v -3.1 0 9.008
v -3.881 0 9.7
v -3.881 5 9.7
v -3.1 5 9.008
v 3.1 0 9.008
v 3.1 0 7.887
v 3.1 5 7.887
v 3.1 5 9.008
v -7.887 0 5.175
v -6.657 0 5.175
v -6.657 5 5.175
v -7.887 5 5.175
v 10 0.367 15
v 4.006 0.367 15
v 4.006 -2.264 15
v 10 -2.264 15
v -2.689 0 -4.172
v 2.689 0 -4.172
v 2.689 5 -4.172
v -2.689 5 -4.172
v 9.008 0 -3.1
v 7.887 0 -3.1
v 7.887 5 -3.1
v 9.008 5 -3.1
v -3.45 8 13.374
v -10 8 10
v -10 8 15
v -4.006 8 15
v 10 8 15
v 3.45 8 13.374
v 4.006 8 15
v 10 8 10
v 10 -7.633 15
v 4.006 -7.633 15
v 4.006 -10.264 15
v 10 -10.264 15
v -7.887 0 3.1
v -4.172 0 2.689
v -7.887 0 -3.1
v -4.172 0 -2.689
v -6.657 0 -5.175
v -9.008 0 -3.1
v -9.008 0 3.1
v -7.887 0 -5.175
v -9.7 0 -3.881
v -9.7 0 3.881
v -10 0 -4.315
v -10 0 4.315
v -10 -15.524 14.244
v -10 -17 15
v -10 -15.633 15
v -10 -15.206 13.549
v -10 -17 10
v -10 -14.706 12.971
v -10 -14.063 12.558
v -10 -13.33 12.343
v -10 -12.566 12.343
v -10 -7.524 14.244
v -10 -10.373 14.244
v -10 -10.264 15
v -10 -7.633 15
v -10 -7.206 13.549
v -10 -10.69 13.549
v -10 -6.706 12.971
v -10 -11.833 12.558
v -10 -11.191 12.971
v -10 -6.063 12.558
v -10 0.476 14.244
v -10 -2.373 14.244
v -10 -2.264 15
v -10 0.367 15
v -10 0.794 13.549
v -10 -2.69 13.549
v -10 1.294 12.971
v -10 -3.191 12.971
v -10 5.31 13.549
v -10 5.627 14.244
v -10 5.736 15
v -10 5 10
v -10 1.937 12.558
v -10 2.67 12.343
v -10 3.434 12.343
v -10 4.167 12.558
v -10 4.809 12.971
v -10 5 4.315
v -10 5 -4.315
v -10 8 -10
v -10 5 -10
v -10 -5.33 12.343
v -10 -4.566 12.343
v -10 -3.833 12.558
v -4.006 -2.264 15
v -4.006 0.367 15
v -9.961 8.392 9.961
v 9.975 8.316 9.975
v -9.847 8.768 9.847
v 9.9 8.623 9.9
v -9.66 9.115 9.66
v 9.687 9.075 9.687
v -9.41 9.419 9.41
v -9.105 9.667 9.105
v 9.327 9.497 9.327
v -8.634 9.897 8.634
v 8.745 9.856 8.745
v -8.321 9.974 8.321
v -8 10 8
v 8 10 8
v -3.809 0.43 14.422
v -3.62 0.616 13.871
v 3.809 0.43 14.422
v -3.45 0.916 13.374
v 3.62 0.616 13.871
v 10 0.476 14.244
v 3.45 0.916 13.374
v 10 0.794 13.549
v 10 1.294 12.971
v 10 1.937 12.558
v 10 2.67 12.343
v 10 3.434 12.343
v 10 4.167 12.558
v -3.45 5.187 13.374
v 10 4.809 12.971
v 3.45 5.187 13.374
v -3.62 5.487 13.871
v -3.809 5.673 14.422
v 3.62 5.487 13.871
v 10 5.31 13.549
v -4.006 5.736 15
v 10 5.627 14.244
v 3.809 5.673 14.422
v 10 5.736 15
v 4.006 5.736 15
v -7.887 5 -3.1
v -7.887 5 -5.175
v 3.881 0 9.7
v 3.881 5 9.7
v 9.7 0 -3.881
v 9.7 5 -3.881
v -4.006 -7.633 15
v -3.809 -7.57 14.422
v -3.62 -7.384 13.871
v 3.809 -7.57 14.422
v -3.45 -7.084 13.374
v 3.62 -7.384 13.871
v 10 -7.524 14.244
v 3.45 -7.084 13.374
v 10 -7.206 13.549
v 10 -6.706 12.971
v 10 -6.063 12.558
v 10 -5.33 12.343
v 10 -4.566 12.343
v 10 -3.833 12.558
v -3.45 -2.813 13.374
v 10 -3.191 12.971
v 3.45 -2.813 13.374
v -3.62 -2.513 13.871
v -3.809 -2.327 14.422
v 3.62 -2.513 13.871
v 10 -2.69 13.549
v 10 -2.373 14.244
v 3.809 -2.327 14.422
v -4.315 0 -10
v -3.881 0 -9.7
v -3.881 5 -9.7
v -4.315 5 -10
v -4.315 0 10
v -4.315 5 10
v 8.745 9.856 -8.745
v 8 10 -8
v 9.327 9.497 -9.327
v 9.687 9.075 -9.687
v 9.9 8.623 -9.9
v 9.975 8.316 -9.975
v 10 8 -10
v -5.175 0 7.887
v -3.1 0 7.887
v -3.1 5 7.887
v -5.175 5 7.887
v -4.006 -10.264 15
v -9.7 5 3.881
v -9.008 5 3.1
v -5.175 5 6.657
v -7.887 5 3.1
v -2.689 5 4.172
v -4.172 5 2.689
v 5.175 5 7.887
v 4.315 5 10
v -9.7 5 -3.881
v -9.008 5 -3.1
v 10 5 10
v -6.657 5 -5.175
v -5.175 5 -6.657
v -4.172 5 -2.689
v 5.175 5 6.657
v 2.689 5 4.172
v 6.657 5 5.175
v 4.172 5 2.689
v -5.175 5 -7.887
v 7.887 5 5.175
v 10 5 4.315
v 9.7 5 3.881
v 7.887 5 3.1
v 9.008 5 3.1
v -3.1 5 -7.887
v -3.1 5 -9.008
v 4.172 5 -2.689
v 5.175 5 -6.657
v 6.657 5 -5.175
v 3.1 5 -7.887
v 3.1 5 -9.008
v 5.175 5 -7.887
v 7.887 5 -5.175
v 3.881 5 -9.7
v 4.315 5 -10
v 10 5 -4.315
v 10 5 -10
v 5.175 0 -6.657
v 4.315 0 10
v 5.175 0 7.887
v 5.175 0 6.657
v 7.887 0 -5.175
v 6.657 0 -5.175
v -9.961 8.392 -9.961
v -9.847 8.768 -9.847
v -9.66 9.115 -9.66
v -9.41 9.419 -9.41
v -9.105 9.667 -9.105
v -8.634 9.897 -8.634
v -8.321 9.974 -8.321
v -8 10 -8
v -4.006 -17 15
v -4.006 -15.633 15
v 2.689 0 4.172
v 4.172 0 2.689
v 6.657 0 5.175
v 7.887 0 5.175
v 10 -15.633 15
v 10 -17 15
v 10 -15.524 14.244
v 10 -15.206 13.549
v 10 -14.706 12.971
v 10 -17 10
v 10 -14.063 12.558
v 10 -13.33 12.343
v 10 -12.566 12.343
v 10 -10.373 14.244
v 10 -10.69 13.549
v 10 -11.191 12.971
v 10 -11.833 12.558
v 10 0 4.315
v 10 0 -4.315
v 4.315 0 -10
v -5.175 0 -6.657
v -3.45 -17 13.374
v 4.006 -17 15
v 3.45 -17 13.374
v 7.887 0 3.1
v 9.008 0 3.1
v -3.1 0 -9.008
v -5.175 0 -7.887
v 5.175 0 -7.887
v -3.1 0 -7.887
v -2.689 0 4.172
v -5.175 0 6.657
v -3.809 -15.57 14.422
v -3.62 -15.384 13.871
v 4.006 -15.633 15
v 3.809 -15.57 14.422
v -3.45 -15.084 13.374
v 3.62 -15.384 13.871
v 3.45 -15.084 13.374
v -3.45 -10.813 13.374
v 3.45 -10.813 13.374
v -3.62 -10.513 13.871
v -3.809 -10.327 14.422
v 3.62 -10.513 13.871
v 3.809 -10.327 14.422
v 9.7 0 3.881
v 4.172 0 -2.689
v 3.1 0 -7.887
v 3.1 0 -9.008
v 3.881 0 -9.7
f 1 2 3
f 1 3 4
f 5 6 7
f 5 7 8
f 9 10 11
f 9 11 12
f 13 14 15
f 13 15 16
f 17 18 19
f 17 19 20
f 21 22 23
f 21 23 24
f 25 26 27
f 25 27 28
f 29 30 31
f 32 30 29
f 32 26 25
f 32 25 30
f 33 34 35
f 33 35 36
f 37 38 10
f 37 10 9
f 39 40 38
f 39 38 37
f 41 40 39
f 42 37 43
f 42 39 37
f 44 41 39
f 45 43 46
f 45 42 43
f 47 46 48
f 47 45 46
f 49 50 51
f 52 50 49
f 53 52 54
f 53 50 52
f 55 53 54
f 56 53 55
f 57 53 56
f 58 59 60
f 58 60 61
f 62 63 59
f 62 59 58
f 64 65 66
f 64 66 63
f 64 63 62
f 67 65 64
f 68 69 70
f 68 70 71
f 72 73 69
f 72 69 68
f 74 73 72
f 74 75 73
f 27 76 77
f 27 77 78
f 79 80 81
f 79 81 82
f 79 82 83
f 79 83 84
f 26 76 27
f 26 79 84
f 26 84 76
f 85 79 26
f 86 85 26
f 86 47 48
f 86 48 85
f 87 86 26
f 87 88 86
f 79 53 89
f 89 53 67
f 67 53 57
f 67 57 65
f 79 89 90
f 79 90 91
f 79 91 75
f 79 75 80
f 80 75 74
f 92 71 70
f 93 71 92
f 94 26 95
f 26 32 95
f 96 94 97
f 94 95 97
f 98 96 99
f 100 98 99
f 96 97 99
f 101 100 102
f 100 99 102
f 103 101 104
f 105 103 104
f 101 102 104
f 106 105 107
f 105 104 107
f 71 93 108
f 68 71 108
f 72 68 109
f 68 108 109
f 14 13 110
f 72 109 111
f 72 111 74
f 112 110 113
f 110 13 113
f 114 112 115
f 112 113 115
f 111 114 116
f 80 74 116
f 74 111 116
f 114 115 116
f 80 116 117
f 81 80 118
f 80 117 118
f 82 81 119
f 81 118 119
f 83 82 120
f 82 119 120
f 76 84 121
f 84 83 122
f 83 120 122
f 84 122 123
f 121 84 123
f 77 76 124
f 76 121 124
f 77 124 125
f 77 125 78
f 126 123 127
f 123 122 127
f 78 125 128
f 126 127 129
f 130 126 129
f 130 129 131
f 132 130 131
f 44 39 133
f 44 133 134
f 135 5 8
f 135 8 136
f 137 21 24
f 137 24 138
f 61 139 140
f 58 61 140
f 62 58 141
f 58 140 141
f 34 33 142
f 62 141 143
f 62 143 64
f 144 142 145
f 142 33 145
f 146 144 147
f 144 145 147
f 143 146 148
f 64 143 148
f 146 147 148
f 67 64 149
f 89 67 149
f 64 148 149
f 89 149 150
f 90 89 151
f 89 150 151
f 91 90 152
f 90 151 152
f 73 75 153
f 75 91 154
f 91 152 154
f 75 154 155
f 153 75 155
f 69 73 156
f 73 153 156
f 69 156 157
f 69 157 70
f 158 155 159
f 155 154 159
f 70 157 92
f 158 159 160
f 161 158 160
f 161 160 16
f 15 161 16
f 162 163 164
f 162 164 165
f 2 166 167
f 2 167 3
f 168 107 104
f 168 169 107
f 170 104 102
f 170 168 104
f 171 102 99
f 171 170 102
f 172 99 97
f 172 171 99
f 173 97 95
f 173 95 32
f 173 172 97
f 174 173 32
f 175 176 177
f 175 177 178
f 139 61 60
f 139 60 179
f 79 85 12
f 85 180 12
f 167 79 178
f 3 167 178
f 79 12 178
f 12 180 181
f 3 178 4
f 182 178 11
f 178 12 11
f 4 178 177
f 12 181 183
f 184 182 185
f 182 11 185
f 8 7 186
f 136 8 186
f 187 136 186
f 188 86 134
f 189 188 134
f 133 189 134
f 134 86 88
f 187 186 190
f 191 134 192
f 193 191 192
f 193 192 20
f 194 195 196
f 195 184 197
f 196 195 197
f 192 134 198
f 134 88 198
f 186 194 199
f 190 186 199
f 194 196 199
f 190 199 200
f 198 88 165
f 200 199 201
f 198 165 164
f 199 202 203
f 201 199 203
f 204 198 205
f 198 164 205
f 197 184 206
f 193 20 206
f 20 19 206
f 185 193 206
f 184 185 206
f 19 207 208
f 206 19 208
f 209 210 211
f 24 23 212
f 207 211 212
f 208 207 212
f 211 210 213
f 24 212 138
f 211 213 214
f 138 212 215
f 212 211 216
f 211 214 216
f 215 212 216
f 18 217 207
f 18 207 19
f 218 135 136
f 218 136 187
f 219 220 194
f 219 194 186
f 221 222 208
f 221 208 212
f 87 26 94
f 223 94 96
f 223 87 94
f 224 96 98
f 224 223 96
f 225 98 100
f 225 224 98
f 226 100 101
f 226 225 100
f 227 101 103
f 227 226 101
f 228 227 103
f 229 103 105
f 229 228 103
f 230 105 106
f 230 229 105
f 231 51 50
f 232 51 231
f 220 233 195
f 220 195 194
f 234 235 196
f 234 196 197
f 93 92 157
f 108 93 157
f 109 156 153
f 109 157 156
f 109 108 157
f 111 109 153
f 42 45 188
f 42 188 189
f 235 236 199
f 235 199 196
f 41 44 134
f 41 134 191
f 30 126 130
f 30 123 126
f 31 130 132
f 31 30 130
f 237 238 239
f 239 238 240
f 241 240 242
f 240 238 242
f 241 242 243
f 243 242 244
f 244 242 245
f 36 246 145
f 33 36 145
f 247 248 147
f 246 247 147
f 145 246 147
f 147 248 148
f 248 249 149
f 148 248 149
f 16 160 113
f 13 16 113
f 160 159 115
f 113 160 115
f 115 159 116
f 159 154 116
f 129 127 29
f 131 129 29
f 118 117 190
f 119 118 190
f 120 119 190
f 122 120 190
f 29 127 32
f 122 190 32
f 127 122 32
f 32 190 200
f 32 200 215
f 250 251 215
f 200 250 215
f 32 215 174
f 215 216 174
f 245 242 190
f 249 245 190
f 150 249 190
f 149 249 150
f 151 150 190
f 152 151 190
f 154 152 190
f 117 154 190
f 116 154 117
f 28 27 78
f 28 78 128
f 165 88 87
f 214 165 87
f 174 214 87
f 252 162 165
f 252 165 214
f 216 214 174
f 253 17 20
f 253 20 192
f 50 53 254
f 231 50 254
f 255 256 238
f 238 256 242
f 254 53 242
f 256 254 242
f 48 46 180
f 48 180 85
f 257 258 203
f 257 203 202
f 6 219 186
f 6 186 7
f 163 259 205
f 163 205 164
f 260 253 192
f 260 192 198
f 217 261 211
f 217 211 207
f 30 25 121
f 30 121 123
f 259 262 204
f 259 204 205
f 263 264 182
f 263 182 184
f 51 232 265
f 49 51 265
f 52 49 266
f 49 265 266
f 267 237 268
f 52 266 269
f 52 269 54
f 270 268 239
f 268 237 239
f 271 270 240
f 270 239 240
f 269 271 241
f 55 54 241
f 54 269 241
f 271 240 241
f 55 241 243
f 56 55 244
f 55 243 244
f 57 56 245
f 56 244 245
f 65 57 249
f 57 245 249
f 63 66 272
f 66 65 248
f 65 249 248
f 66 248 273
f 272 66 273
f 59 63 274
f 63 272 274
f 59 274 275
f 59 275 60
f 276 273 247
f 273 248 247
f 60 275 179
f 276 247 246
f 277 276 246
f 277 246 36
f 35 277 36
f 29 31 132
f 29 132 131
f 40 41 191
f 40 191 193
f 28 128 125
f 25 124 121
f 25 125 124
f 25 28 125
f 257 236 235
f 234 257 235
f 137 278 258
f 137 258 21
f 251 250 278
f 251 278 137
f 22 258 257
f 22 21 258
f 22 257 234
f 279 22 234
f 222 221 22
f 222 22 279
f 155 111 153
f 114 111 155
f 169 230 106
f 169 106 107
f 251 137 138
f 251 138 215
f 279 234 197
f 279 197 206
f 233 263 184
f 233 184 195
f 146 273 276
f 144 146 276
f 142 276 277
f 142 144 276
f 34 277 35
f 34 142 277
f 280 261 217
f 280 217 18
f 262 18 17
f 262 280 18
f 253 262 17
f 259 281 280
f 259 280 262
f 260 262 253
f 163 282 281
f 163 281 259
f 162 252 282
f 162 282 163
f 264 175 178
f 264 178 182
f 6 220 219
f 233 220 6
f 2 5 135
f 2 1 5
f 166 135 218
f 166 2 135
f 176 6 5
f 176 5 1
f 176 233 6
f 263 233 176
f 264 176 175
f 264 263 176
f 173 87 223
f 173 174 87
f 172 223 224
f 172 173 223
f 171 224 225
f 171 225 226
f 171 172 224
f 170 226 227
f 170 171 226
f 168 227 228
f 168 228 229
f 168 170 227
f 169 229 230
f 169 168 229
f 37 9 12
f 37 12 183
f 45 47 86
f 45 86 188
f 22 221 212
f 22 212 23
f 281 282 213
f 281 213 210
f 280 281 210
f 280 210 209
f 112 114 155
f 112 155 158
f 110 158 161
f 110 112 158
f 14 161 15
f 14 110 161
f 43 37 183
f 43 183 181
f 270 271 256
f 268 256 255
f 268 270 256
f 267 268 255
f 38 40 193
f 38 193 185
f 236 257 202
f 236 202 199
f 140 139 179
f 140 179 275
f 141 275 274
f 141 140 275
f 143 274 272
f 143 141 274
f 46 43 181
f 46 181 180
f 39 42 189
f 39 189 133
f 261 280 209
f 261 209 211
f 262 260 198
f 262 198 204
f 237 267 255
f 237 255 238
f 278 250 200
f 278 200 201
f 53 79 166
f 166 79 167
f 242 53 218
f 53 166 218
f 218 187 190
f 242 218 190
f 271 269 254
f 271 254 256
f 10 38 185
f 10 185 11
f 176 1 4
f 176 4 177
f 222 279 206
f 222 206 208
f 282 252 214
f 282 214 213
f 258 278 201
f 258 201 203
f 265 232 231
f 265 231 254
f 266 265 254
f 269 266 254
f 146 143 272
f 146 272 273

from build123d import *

# Parameters (mm, degrees)
SALIENTE_EXTRUIR1_DEPTH   = 5
SALIENTE_EXTRUIR1_2_DEPTH = 5
SALIENTE_EXTRUIR1_3_DEPTH = 5
SALIENTE_EXTRUIR1_4_DEPTH = 5
CROQUIS3_W                = 20
CROQUIS3_H                = 20
SALIENTE_EXTRUIR2_DEPTH   = 5
REDONDEO1_R               = 2
CROQUIS4_W                = 20
CROQUIS4_H                = 25
SALIENTE_EXTRUIR3_DEPTH   = 5
CORTAR_EXTRUIR1_DEPTH     = 31.822070015
CORTAR_EXTRUIR2_DEPTH     = 31.232432916


with BuildPart() as part:
    # Croquis2 → Saliente-Extruir1 (new body)
    with BuildSketch(Plane(origin=(0, 0, 0), x_dir=(1, 0, 0), z_dir=(0, 1, 0))):
        Polygon((-3.880962474, 9.7), (-4.31520152, 10), (4.31520152, 10), (3.880962474, 9.7), (3.100109842, 9.007732001), (3.100109842, 7.886854264), (5.174607071, 7.886854264), (5.174607071, 6.657084853), (2.689193029, 4.171670811), (-2.689193029, 4.171670811), (-5.174607071, 6.657084853), (-5.174607071, 7.886854264), (-3.100109842, 7.886854264), (-3.100109842, 9.007732001), align=None)
    extrude(amount=SALIENTE_EXTRUIR1_DEPTH)



with BuildPart() as body_2:
    # Croquis2 → Saliente-Extruir1 2 (new body)
    with BuildSketch(Plane(origin=(0, 0, 0), x_dir=(1, 0, 0), z_dir=(0, 1, 0))):
        Polygon((10, 4.31520152), (10, -4.31520152), (9.7, -3.880962474), (9.007732001, -3.100109842), (7.886854264, -3.100109842), (7.886854264, -5.174607071), (6.657084853, -5.174607071), (4.171670811, -2.689193029), (4.171670811, 2.689193029), (6.657084853, 5.174607071), (7.886854264, 5.174607071), (7.886854264, 3.100109842), (9.007732001, 3.100109842), (9.7, 3.880962474), align=None)
    extrude(amount=SALIENTE_EXTRUIR1_2_DEPTH)


with BuildPart() as body_3:
    # Croquis2 → Saliente-Extruir1 3 (new body)
    with BuildSketch(Plane(origin=(0, 0, 0), x_dir=(1, 0, 0), z_dir=(0, 1, 0))):
        Polygon((4.31520152, -10), (-4.31520152, -10), (-3.880962474, -9.7), (-3.100109842, -9.007732001), (-3.100109842, -7.886854264), (-5.174607071, -7.886854264), (-5.174607071, -6.657084853), (-2.689193029, -4.171670811), (2.689193029, -4.171670811), (5.174607071, -6.657084853), (5.174607071, -7.886854264), (3.100109842, -7.886854264), (3.100109842, -9.007732001), (3.880962474, -9.7), align=None)
    extrude(amount=SALIENTE_EXTRUIR1_3_DEPTH)


with BuildPart() as body_4:
    # Croquis2 → Saliente-Extruir1 4 (new body)
    with BuildSketch(Plane(origin=(0, 0, 0), x_dir=(1, 0, 0), z_dir=(0, 1, 0))):
        Polygon((-10, -4.31520152), (-10, 4.31520152), (-9.7, 3.880962474), (-9.007732001, 3.100109842), (-7.886854264, 3.100109842), (-7.886854264, 5.174607071), (-6.657084853, 5.174607071), (-4.171670811, 2.689193029), (-4.171670811, -2.689193029), (-6.657084853, -5.174607071), (-7.886854264, -5.174607071), (-7.886854264, -3.100109842), (-9.007732001, -3.100109842), (-9.7, -3.880962474), align=None)
    extrude(amount=SALIENTE_EXTRUIR1_4_DEPTH)


with BuildPart() as part_1:
    add(part.part)

    add(body_2.part)  # Saliente-Extruir2 merges body 2

    add(body_3.part)  # Saliente-Extruir2 merges body 3

    add(body_4.part)  # Saliente-Extruir2 merges body 4
    # Croquis3 → Saliente-Extruir2 (add)
    with BuildSketch(Plane(origin=(0, 5, 0), x_dir=(1, 0, 0), z_dir=(0, 1, 0))):
        Rectangle(CROQUIS3_W, CROQUIS3_H)
    extrude(amount=SALIENTE_EXTRUIR2_DEPTH)

    # Redondeo1
    redondeo1_edges = [part_1.edges().sort_by_distance(p)[0] for p in [
        (10, 10, 0),
        (0, 10, -10),
        (-10, 10, 0),
        (0, 10, 10),
    ]]
    fillet(redondeo1_edges, radius=REDONDEO1_R)

    # Croquis4 → Saliente-Extruir3 (add)
    with BuildSketch(Plane.XY.offset(10)):
        with Locations((0, -4.5)):
            Rectangle(CROQUIS4_W, CROQUIS4_H)
    extrude(amount=SALIENTE_EXTRUIR3_DEPTH)

    # Croquis5 → Cortar-Extruir1 (cut, through all)
    with BuildSketch(Plane(origin=(0, 8, 0), x_dir=(1, 0, 0), z_dir=(0, 1, 0))):
        Polygon((4.006067099, -15), (-4.006067099, -15), (-3.450123093, -13.373585697), (3.450123093, -13.373585697), align=None)
    extrude(amount=-CORTAR_EXTRUIR1_DEPTH, mode=Mode.SUBTRACT)

    # Croquis6 → Cortar-Extruir2 (cut, through all)
    with BuildSketch(Plane(origin=(10, 0, 0), x_dir=(0, 0, -1), z_dir=(1, 0, 0))):
        with BuildLine():
            Line((-15, 5.73584659), (-15, 0.367400389))
            ThreePointArc((-15, 0.367400389), (-12.315776899, 3.051623489), (-15, 5.73584659))
        make_face()
        with BuildLine():
            Line((-15, -2.26415341), (-15, -7.632599611))
            ThreePointArc((-15, -7.632599611), (-12.315776899, -4.948376511), (-15, -2.26415341))
        make_face()
        with BuildLine():
            Line((-15, -10.26415341), (-15, -15.632599611))
            ThreePointArc((-15, -15.632599611), (-12.315776899, -12.948376511), (-15, -10.26415341))
        make_face()
    extrude(amount=-CORTAR_EXTRUIR2_DEPTH, mode=Mode.SUBTRACT)


solid = part_1.part
